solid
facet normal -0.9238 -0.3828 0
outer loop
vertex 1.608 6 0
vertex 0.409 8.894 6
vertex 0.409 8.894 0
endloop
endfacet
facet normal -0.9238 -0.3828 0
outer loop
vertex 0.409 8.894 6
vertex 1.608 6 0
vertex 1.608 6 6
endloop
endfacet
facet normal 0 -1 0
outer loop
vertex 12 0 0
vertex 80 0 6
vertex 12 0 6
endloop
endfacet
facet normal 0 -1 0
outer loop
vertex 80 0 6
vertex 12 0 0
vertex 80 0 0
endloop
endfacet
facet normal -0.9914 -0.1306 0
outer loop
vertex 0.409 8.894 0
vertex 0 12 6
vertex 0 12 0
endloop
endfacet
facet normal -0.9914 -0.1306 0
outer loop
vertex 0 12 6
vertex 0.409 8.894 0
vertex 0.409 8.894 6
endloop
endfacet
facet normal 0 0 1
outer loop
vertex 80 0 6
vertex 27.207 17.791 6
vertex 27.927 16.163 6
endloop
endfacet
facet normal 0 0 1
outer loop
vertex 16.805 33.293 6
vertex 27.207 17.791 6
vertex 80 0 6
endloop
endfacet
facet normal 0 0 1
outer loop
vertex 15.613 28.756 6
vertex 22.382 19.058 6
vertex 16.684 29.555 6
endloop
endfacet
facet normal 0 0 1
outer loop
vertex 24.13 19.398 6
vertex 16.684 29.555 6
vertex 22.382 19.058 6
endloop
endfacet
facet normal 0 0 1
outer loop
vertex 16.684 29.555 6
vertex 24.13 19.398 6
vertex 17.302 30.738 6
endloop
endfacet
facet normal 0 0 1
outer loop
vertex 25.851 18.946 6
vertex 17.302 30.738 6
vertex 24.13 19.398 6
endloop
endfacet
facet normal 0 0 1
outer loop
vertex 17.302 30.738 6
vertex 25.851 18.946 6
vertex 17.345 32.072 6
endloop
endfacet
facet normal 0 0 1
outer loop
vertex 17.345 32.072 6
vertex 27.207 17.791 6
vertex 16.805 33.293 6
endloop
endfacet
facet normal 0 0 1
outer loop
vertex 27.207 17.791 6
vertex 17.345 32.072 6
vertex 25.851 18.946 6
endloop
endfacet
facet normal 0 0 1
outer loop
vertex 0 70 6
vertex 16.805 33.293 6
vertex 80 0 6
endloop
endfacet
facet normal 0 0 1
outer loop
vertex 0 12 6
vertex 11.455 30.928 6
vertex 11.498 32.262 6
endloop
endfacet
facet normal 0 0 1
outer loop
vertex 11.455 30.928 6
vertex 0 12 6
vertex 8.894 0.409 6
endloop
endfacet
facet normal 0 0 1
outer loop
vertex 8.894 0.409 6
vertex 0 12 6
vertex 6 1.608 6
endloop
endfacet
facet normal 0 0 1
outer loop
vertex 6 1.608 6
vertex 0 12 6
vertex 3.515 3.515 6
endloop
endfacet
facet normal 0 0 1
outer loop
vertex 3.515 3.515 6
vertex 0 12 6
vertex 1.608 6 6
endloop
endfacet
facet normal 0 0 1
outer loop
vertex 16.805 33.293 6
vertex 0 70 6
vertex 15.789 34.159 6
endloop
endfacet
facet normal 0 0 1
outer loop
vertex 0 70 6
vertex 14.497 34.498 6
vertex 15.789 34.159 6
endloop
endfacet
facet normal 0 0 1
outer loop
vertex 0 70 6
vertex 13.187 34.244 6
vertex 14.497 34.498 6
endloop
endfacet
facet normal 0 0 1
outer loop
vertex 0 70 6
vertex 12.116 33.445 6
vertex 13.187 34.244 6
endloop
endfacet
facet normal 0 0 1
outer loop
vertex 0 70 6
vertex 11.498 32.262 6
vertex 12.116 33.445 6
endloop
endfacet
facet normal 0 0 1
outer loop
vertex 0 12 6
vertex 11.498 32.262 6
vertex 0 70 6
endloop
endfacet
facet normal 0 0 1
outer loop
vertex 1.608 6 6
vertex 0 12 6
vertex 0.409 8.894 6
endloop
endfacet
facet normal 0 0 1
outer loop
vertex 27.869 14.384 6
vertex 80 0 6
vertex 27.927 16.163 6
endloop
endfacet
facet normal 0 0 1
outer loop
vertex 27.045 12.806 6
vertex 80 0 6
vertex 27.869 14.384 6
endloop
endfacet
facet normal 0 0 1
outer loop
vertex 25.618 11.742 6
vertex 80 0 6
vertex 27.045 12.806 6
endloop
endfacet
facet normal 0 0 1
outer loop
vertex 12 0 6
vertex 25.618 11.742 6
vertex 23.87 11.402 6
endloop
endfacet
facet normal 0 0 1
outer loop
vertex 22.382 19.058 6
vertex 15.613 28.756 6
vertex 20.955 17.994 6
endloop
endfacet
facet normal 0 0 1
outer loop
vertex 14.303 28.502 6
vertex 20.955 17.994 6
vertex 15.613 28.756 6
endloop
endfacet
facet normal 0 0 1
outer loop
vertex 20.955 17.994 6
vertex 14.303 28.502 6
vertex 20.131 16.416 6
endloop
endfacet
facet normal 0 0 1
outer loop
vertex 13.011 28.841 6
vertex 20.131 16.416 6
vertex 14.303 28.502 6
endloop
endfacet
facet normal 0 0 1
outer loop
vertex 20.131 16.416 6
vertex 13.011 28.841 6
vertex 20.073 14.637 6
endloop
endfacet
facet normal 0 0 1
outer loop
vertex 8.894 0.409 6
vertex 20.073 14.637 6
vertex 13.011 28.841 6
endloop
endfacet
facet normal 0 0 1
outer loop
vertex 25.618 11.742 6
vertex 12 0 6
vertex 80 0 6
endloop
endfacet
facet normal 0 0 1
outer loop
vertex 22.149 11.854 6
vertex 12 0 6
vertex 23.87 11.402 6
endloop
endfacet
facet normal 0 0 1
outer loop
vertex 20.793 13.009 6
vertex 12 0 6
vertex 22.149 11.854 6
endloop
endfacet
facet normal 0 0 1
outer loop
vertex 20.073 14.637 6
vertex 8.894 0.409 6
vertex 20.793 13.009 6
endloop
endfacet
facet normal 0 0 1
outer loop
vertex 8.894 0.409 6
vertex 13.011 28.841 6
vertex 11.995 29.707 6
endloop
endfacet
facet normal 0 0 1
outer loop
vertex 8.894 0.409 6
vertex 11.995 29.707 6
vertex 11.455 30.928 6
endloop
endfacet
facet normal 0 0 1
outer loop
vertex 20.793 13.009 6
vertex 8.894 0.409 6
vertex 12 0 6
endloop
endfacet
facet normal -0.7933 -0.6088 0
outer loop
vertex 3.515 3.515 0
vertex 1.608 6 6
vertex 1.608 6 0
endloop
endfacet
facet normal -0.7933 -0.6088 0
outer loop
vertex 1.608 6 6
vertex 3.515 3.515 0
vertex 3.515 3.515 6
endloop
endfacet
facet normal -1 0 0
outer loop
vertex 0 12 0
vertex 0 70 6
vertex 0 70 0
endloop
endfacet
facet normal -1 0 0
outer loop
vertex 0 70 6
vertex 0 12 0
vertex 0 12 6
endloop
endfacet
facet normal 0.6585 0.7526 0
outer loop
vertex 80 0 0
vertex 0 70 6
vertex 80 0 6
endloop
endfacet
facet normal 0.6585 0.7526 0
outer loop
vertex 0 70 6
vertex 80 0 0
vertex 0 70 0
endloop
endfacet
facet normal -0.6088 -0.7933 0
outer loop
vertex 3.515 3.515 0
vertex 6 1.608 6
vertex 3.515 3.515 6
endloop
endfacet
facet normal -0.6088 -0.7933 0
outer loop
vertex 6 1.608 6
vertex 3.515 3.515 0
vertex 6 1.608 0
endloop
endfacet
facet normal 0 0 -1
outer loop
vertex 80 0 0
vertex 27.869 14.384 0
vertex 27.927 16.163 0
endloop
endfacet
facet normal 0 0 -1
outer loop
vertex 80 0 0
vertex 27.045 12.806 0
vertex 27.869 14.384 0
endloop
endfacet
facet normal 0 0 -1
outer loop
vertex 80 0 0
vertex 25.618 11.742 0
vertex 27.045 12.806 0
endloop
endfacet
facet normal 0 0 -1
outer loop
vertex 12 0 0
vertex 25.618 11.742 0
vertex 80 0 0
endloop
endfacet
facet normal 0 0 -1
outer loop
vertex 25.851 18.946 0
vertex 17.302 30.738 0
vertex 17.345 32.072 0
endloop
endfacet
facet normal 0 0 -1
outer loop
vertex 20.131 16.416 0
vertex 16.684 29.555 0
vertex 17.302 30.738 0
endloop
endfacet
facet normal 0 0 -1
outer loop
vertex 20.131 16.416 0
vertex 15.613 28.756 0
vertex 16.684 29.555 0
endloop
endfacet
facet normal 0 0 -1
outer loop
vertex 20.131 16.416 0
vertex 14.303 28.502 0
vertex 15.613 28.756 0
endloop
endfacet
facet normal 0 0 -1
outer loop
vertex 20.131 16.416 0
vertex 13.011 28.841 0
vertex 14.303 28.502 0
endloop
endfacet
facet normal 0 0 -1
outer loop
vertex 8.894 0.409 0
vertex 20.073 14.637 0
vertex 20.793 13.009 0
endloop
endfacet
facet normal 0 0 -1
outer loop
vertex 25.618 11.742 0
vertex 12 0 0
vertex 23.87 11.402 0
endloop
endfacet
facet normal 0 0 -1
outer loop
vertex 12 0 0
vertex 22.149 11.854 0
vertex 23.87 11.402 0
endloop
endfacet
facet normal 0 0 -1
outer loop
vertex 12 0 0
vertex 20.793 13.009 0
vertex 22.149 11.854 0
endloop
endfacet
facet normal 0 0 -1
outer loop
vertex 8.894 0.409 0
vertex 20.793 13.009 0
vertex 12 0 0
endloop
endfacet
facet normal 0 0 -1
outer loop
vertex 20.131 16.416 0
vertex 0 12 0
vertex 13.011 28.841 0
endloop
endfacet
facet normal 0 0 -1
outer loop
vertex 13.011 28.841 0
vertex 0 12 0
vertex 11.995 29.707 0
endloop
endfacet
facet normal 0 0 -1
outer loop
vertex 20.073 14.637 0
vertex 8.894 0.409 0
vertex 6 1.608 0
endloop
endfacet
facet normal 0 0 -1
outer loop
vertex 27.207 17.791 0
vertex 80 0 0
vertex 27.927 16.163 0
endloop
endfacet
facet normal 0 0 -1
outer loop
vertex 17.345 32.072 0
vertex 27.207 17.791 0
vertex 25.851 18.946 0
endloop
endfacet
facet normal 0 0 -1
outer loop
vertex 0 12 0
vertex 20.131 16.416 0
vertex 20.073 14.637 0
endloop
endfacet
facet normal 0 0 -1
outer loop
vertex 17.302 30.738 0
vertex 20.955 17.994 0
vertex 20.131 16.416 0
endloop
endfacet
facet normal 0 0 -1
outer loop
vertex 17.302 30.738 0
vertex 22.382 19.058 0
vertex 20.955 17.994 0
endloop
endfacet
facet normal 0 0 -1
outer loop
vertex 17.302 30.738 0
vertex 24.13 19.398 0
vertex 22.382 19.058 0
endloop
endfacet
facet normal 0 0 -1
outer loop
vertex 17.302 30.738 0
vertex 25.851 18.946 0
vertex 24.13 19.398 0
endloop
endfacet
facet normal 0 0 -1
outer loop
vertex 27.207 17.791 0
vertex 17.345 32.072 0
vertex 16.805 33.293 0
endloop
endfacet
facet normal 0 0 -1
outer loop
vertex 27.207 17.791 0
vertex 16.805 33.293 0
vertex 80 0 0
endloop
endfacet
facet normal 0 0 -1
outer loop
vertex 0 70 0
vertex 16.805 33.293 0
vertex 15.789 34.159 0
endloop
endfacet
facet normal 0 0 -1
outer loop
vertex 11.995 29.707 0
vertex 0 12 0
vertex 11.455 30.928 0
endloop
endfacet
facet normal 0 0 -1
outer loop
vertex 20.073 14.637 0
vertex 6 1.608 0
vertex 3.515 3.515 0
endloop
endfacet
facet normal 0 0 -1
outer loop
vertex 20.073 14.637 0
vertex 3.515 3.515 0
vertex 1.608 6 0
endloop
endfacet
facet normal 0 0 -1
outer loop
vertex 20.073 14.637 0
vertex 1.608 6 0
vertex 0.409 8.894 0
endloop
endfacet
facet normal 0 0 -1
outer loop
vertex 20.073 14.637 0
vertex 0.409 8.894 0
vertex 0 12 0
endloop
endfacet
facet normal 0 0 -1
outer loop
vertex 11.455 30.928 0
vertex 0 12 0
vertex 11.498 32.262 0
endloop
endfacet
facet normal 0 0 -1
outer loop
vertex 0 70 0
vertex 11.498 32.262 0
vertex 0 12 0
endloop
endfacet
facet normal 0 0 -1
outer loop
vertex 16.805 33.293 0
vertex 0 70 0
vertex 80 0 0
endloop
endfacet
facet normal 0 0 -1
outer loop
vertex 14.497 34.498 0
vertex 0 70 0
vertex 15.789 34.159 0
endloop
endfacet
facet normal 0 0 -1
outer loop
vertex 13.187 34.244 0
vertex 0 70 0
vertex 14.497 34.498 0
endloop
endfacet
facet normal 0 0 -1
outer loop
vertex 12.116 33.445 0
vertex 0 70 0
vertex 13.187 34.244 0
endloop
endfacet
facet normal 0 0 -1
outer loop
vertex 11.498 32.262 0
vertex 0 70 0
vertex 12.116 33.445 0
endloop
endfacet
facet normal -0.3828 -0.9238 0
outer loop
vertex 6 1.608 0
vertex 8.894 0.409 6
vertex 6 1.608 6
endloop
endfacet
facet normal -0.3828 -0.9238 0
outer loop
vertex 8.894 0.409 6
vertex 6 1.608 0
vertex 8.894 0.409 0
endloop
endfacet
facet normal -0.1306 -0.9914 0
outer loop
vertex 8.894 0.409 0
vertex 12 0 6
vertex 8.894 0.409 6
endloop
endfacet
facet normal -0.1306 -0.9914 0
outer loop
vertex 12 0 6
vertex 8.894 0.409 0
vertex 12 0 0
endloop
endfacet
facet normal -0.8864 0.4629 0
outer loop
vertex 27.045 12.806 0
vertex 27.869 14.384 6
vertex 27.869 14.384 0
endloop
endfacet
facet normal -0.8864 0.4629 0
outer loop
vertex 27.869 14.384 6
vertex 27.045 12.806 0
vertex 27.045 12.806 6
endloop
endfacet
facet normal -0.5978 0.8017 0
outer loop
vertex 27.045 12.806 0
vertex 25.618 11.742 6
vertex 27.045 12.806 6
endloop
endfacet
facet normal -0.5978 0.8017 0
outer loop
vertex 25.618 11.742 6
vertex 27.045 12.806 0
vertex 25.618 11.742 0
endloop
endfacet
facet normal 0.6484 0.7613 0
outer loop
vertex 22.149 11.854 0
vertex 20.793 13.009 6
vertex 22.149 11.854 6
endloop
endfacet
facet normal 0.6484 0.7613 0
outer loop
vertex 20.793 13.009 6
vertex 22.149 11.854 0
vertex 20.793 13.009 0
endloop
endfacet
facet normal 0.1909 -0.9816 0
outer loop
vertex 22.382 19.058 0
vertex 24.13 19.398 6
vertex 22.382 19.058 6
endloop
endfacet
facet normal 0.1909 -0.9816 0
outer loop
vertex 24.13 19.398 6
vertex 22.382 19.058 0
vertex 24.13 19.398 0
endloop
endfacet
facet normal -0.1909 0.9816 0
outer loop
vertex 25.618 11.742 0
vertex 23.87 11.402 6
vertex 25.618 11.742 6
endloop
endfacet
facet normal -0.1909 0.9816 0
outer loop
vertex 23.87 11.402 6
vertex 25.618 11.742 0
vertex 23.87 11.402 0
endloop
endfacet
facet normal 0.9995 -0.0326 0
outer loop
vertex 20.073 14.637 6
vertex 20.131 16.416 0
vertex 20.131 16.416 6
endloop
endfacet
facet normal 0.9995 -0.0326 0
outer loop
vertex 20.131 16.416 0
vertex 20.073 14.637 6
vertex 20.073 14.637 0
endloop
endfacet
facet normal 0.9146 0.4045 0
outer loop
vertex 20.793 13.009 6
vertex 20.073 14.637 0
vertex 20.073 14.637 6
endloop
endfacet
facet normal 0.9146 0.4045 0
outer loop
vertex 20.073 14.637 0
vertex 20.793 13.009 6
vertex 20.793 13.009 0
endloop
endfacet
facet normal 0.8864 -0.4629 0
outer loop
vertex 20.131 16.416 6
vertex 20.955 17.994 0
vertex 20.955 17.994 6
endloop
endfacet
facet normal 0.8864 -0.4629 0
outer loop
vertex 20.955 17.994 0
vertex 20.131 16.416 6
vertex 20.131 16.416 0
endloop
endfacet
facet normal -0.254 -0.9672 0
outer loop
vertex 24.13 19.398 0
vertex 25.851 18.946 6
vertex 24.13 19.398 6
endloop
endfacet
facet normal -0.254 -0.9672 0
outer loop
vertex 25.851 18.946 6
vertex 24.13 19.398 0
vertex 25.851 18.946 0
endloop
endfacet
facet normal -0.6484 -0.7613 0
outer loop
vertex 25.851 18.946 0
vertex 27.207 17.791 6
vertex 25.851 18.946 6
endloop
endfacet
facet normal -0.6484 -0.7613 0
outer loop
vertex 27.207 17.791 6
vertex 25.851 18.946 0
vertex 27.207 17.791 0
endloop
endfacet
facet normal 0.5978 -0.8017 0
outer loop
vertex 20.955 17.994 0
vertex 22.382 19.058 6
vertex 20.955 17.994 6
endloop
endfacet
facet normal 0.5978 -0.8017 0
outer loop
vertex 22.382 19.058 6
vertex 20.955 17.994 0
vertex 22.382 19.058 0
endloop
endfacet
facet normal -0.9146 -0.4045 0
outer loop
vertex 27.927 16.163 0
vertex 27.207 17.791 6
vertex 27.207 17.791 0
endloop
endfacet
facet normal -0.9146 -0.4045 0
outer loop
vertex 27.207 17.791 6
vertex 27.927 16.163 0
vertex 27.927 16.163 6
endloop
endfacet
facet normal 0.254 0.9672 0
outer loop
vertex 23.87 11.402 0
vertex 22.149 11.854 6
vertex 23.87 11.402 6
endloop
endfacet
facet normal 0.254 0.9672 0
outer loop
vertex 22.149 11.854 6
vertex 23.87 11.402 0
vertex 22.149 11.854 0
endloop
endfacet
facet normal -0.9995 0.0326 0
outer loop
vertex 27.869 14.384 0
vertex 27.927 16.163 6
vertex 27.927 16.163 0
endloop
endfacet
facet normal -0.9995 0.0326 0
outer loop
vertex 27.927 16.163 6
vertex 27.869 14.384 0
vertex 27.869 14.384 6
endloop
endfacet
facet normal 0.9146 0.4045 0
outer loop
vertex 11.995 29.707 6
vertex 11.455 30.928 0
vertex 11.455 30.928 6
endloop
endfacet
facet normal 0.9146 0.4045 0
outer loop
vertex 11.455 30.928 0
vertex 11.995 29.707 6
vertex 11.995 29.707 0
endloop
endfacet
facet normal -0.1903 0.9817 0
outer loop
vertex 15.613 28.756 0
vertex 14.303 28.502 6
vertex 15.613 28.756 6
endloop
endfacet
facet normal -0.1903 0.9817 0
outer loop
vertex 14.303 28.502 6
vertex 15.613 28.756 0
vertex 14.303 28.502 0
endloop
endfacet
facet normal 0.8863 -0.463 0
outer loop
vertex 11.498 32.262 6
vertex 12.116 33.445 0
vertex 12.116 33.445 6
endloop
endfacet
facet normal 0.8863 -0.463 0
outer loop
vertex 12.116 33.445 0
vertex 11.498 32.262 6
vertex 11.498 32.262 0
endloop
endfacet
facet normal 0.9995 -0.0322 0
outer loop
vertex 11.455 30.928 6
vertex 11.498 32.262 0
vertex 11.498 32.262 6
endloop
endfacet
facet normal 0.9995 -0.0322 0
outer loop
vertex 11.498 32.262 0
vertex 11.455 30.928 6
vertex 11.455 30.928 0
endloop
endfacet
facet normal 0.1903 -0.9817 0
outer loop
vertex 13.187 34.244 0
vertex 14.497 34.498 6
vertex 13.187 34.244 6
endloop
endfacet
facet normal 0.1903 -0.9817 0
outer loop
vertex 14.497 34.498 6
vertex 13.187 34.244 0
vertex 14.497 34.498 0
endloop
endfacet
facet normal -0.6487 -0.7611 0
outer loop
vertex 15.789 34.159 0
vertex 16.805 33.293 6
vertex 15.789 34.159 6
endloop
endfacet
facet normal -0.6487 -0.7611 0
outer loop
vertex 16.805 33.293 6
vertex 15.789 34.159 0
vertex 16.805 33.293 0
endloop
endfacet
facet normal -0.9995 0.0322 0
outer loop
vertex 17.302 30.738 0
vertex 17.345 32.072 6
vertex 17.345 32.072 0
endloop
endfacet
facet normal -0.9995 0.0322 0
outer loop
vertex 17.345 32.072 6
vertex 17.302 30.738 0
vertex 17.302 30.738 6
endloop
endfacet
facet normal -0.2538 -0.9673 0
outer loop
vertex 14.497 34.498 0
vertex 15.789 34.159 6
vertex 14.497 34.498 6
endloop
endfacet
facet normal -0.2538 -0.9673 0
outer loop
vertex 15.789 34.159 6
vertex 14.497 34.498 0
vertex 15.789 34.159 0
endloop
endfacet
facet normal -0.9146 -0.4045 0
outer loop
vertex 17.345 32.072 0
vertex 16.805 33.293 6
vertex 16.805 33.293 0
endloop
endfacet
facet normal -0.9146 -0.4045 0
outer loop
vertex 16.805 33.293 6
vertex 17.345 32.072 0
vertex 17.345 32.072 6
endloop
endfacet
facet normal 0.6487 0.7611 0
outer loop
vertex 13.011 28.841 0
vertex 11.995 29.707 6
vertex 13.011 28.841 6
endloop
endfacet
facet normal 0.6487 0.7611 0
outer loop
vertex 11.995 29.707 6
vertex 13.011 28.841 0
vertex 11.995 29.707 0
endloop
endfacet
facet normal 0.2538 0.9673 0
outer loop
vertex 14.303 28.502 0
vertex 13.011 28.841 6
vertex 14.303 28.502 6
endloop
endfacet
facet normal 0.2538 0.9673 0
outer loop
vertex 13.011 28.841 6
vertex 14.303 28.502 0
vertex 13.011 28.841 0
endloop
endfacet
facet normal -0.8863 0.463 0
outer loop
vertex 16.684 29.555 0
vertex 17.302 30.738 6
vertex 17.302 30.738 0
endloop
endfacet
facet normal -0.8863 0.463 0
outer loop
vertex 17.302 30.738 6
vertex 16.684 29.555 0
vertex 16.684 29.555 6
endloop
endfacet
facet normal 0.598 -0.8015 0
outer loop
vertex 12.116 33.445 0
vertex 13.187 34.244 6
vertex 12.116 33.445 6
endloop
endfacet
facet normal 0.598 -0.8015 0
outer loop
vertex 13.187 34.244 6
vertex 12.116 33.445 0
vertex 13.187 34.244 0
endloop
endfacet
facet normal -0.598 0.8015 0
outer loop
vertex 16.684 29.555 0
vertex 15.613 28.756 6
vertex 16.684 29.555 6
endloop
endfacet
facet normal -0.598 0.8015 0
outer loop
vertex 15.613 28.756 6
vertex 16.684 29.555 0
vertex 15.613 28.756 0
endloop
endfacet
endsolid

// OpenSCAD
$fn = 32;

// ----------------------------------------------------------------------
// Bracket plate: corner pad 80 x 70, fillet R12
// ----------------------------------------------------------------------

// --- parameters (mm) ---
hole_r = 3;               // bolt hole radius
plate_t = 6;              // plate thickness, Z (extrusion height)
leg_a = 80;               // base leg
leg_b = 70;               // height leg
fillet_r = 12;            // right-angle fillet radius
fit_tol = 0.05;           // declared fit tolerance (prompt contract)
free_tol = 0.3;           // declared free tolerance (prompt contract)

hole_d1 = 2 * hole_r + 2;
hole_d2 = 2 * hole_r;

profile = [[12, 0], [80, 0], [0, 70], [0, 12], [0.409, 8.894], [1.608, 6], [3.515, 3.515], [6, 1.608], [8.894, 0.409]];  // primary outline, 9 points, counter clockwise
void_1 = [[27.927, 16.163], [27.207, 17.791], [25.851, 18.946], [24.13, 19.398], [22.382, 19.058], [20.955, 17.994], [20.131, 16.416], [20.073, 14.637], [20.793, 13.009], [22.149, 11.854], [23.87, 11.402], [25.618, 11.742], [27.045, 12.806], [27.869, 14.384]];  // mount hole 1, 14 points
void_2 = [[17.345, 32.072], [16.805, 33.293], [15.789, 34.159], [14.497, 34.498], [13.187, 34.244], [12.116, 33.445], [11.498, 32.262], [11.455, 30.928], [11.995, 29.707], [13.011, 28.841], [14.303, 28.502], [15.613, 28.756], [16.684, 29.555], [17.302, 30.738]];  // mount hole 2, 14 points

// --- the one profile operation ---
difference() {
  linear_extrude(height = plate_t) polygon(points = profile);
  translate([0, 0, -1])
    linear_extrude(height = plate_t + 2) polygon(points = void_1);
  translate([0, 0, -1])
    linear_extrude(height = plate_t + 2) polygon(points = void_2);
}
